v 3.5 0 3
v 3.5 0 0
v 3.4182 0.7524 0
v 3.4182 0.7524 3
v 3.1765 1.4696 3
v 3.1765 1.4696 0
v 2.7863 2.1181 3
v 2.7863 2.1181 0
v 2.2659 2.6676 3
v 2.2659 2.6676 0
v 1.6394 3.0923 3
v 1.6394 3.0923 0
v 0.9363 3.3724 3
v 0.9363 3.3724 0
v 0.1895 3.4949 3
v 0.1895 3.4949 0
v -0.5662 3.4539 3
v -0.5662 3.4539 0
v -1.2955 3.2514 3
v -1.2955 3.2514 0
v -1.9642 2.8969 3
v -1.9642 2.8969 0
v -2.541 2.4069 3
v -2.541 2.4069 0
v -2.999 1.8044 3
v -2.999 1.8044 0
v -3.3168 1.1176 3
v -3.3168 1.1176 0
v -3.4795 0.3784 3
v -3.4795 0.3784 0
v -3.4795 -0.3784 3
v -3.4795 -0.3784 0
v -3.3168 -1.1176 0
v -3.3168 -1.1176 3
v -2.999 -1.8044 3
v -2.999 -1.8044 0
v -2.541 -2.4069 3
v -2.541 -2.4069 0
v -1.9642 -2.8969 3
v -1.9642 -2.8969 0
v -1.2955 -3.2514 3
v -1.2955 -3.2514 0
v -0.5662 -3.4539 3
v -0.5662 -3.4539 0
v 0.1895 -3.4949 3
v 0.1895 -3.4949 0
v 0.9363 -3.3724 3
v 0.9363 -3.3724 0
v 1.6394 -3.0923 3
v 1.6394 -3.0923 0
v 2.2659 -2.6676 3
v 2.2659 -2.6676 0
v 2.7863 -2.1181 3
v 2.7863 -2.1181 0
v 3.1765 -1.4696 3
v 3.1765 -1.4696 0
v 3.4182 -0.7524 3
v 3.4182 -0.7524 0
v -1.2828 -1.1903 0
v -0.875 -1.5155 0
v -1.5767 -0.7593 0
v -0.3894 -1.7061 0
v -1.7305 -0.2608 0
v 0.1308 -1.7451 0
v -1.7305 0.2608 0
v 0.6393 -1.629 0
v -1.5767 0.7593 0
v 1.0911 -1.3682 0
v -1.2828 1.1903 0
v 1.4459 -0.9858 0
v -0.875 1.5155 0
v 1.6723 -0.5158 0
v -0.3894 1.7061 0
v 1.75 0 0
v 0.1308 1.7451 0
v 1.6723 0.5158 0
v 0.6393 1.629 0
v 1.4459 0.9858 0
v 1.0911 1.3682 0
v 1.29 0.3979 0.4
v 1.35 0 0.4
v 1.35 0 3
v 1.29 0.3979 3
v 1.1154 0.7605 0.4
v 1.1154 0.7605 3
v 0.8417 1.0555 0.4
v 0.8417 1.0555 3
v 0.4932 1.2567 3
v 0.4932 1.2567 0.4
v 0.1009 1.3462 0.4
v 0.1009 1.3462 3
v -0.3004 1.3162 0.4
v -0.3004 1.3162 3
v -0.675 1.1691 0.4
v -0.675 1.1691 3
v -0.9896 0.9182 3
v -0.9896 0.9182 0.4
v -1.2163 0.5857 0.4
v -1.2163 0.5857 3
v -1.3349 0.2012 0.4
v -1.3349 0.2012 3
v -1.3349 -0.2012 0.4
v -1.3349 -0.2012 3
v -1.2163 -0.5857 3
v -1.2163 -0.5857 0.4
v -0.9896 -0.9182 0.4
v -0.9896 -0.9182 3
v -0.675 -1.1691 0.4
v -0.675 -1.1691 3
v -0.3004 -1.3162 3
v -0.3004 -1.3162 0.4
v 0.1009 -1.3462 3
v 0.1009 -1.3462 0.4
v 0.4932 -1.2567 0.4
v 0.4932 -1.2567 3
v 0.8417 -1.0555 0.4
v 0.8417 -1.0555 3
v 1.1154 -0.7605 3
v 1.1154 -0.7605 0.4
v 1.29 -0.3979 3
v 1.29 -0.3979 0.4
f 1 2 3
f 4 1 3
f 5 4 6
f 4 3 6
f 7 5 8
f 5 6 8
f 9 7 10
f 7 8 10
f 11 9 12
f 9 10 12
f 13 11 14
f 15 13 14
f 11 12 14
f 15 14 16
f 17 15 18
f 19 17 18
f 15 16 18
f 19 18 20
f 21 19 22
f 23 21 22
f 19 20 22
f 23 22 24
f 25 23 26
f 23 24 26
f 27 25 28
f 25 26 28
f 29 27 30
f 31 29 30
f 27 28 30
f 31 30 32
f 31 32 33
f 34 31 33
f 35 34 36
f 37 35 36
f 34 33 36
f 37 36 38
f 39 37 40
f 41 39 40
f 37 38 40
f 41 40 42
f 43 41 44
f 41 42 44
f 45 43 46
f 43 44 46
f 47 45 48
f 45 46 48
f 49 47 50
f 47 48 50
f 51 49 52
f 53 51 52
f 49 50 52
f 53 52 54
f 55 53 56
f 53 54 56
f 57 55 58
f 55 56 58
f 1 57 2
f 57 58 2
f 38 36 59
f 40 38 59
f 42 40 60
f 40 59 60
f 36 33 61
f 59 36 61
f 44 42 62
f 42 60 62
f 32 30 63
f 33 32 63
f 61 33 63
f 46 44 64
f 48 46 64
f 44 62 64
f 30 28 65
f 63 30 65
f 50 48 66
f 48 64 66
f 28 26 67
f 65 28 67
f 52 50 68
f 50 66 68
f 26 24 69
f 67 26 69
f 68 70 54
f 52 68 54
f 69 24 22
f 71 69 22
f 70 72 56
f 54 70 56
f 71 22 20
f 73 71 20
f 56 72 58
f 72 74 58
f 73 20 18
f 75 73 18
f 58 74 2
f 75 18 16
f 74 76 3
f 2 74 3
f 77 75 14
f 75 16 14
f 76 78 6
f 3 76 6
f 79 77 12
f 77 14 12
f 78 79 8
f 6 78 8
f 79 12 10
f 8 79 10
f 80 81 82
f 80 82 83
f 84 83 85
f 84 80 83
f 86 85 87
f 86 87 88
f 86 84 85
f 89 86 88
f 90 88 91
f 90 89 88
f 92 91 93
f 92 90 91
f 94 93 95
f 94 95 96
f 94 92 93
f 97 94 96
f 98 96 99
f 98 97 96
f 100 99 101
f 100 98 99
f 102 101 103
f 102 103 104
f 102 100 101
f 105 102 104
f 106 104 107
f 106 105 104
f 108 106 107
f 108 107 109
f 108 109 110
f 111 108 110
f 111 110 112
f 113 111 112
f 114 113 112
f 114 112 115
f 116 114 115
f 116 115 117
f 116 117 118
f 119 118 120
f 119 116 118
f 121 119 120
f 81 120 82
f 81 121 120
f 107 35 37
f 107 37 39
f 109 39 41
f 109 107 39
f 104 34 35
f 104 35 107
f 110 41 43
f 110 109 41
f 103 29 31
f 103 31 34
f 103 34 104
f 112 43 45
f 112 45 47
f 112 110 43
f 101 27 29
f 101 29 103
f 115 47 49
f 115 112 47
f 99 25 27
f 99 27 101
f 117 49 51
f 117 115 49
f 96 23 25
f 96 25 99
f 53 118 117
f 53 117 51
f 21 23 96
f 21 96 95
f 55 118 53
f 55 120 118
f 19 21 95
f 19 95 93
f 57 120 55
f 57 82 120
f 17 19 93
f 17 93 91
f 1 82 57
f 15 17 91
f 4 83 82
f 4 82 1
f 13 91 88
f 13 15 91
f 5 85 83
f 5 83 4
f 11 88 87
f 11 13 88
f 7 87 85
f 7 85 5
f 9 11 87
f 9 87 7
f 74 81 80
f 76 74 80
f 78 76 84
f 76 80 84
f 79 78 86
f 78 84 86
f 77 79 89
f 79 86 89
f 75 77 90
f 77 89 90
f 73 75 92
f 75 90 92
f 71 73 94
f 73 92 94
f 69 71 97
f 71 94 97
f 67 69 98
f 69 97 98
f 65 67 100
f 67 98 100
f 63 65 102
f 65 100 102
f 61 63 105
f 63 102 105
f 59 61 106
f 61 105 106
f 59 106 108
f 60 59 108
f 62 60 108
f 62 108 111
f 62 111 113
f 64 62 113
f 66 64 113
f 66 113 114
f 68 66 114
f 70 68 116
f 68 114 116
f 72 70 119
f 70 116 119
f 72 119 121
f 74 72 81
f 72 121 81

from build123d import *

# Parameters (mm, degrees)
CYLINDER001_R     = 1.35
CYLINDER001_DEPTH = 3
CYLINDER_R        = 3.5
CYLINDER_DEPTH    = 3
CHAMFER_SIZE      = 0.4


with BuildPart() as cylinder001:
    # Cylinder001 → Cylinder001 (new body)
    with BuildSketch(Plane.XY):
        Circle(CYLINDER001_R)
    extrude(amount=CYLINDER001_DEPTH)


with BuildPart() as chamfer_body:
    # Cylinder → Cylinder (new body)
    with BuildSketch(Plane.XY):
        Circle(CYLINDER_R)
    extrude(amount=CYLINDER_DEPTH)

    # Cut: cut Cylinder001
    add(cylinder001.part, mode=Mode.SUBTRACT)

    # Chamfer
    chamfer_edges = [chamfer_body.edges().sort_by_distance(p)[0] for p in [
        (-1.35, 0, 0),
    ]]
    chamfer(chamfer_edges, length=CHAMFER_SIZE)


solid = chamfer_body.part
